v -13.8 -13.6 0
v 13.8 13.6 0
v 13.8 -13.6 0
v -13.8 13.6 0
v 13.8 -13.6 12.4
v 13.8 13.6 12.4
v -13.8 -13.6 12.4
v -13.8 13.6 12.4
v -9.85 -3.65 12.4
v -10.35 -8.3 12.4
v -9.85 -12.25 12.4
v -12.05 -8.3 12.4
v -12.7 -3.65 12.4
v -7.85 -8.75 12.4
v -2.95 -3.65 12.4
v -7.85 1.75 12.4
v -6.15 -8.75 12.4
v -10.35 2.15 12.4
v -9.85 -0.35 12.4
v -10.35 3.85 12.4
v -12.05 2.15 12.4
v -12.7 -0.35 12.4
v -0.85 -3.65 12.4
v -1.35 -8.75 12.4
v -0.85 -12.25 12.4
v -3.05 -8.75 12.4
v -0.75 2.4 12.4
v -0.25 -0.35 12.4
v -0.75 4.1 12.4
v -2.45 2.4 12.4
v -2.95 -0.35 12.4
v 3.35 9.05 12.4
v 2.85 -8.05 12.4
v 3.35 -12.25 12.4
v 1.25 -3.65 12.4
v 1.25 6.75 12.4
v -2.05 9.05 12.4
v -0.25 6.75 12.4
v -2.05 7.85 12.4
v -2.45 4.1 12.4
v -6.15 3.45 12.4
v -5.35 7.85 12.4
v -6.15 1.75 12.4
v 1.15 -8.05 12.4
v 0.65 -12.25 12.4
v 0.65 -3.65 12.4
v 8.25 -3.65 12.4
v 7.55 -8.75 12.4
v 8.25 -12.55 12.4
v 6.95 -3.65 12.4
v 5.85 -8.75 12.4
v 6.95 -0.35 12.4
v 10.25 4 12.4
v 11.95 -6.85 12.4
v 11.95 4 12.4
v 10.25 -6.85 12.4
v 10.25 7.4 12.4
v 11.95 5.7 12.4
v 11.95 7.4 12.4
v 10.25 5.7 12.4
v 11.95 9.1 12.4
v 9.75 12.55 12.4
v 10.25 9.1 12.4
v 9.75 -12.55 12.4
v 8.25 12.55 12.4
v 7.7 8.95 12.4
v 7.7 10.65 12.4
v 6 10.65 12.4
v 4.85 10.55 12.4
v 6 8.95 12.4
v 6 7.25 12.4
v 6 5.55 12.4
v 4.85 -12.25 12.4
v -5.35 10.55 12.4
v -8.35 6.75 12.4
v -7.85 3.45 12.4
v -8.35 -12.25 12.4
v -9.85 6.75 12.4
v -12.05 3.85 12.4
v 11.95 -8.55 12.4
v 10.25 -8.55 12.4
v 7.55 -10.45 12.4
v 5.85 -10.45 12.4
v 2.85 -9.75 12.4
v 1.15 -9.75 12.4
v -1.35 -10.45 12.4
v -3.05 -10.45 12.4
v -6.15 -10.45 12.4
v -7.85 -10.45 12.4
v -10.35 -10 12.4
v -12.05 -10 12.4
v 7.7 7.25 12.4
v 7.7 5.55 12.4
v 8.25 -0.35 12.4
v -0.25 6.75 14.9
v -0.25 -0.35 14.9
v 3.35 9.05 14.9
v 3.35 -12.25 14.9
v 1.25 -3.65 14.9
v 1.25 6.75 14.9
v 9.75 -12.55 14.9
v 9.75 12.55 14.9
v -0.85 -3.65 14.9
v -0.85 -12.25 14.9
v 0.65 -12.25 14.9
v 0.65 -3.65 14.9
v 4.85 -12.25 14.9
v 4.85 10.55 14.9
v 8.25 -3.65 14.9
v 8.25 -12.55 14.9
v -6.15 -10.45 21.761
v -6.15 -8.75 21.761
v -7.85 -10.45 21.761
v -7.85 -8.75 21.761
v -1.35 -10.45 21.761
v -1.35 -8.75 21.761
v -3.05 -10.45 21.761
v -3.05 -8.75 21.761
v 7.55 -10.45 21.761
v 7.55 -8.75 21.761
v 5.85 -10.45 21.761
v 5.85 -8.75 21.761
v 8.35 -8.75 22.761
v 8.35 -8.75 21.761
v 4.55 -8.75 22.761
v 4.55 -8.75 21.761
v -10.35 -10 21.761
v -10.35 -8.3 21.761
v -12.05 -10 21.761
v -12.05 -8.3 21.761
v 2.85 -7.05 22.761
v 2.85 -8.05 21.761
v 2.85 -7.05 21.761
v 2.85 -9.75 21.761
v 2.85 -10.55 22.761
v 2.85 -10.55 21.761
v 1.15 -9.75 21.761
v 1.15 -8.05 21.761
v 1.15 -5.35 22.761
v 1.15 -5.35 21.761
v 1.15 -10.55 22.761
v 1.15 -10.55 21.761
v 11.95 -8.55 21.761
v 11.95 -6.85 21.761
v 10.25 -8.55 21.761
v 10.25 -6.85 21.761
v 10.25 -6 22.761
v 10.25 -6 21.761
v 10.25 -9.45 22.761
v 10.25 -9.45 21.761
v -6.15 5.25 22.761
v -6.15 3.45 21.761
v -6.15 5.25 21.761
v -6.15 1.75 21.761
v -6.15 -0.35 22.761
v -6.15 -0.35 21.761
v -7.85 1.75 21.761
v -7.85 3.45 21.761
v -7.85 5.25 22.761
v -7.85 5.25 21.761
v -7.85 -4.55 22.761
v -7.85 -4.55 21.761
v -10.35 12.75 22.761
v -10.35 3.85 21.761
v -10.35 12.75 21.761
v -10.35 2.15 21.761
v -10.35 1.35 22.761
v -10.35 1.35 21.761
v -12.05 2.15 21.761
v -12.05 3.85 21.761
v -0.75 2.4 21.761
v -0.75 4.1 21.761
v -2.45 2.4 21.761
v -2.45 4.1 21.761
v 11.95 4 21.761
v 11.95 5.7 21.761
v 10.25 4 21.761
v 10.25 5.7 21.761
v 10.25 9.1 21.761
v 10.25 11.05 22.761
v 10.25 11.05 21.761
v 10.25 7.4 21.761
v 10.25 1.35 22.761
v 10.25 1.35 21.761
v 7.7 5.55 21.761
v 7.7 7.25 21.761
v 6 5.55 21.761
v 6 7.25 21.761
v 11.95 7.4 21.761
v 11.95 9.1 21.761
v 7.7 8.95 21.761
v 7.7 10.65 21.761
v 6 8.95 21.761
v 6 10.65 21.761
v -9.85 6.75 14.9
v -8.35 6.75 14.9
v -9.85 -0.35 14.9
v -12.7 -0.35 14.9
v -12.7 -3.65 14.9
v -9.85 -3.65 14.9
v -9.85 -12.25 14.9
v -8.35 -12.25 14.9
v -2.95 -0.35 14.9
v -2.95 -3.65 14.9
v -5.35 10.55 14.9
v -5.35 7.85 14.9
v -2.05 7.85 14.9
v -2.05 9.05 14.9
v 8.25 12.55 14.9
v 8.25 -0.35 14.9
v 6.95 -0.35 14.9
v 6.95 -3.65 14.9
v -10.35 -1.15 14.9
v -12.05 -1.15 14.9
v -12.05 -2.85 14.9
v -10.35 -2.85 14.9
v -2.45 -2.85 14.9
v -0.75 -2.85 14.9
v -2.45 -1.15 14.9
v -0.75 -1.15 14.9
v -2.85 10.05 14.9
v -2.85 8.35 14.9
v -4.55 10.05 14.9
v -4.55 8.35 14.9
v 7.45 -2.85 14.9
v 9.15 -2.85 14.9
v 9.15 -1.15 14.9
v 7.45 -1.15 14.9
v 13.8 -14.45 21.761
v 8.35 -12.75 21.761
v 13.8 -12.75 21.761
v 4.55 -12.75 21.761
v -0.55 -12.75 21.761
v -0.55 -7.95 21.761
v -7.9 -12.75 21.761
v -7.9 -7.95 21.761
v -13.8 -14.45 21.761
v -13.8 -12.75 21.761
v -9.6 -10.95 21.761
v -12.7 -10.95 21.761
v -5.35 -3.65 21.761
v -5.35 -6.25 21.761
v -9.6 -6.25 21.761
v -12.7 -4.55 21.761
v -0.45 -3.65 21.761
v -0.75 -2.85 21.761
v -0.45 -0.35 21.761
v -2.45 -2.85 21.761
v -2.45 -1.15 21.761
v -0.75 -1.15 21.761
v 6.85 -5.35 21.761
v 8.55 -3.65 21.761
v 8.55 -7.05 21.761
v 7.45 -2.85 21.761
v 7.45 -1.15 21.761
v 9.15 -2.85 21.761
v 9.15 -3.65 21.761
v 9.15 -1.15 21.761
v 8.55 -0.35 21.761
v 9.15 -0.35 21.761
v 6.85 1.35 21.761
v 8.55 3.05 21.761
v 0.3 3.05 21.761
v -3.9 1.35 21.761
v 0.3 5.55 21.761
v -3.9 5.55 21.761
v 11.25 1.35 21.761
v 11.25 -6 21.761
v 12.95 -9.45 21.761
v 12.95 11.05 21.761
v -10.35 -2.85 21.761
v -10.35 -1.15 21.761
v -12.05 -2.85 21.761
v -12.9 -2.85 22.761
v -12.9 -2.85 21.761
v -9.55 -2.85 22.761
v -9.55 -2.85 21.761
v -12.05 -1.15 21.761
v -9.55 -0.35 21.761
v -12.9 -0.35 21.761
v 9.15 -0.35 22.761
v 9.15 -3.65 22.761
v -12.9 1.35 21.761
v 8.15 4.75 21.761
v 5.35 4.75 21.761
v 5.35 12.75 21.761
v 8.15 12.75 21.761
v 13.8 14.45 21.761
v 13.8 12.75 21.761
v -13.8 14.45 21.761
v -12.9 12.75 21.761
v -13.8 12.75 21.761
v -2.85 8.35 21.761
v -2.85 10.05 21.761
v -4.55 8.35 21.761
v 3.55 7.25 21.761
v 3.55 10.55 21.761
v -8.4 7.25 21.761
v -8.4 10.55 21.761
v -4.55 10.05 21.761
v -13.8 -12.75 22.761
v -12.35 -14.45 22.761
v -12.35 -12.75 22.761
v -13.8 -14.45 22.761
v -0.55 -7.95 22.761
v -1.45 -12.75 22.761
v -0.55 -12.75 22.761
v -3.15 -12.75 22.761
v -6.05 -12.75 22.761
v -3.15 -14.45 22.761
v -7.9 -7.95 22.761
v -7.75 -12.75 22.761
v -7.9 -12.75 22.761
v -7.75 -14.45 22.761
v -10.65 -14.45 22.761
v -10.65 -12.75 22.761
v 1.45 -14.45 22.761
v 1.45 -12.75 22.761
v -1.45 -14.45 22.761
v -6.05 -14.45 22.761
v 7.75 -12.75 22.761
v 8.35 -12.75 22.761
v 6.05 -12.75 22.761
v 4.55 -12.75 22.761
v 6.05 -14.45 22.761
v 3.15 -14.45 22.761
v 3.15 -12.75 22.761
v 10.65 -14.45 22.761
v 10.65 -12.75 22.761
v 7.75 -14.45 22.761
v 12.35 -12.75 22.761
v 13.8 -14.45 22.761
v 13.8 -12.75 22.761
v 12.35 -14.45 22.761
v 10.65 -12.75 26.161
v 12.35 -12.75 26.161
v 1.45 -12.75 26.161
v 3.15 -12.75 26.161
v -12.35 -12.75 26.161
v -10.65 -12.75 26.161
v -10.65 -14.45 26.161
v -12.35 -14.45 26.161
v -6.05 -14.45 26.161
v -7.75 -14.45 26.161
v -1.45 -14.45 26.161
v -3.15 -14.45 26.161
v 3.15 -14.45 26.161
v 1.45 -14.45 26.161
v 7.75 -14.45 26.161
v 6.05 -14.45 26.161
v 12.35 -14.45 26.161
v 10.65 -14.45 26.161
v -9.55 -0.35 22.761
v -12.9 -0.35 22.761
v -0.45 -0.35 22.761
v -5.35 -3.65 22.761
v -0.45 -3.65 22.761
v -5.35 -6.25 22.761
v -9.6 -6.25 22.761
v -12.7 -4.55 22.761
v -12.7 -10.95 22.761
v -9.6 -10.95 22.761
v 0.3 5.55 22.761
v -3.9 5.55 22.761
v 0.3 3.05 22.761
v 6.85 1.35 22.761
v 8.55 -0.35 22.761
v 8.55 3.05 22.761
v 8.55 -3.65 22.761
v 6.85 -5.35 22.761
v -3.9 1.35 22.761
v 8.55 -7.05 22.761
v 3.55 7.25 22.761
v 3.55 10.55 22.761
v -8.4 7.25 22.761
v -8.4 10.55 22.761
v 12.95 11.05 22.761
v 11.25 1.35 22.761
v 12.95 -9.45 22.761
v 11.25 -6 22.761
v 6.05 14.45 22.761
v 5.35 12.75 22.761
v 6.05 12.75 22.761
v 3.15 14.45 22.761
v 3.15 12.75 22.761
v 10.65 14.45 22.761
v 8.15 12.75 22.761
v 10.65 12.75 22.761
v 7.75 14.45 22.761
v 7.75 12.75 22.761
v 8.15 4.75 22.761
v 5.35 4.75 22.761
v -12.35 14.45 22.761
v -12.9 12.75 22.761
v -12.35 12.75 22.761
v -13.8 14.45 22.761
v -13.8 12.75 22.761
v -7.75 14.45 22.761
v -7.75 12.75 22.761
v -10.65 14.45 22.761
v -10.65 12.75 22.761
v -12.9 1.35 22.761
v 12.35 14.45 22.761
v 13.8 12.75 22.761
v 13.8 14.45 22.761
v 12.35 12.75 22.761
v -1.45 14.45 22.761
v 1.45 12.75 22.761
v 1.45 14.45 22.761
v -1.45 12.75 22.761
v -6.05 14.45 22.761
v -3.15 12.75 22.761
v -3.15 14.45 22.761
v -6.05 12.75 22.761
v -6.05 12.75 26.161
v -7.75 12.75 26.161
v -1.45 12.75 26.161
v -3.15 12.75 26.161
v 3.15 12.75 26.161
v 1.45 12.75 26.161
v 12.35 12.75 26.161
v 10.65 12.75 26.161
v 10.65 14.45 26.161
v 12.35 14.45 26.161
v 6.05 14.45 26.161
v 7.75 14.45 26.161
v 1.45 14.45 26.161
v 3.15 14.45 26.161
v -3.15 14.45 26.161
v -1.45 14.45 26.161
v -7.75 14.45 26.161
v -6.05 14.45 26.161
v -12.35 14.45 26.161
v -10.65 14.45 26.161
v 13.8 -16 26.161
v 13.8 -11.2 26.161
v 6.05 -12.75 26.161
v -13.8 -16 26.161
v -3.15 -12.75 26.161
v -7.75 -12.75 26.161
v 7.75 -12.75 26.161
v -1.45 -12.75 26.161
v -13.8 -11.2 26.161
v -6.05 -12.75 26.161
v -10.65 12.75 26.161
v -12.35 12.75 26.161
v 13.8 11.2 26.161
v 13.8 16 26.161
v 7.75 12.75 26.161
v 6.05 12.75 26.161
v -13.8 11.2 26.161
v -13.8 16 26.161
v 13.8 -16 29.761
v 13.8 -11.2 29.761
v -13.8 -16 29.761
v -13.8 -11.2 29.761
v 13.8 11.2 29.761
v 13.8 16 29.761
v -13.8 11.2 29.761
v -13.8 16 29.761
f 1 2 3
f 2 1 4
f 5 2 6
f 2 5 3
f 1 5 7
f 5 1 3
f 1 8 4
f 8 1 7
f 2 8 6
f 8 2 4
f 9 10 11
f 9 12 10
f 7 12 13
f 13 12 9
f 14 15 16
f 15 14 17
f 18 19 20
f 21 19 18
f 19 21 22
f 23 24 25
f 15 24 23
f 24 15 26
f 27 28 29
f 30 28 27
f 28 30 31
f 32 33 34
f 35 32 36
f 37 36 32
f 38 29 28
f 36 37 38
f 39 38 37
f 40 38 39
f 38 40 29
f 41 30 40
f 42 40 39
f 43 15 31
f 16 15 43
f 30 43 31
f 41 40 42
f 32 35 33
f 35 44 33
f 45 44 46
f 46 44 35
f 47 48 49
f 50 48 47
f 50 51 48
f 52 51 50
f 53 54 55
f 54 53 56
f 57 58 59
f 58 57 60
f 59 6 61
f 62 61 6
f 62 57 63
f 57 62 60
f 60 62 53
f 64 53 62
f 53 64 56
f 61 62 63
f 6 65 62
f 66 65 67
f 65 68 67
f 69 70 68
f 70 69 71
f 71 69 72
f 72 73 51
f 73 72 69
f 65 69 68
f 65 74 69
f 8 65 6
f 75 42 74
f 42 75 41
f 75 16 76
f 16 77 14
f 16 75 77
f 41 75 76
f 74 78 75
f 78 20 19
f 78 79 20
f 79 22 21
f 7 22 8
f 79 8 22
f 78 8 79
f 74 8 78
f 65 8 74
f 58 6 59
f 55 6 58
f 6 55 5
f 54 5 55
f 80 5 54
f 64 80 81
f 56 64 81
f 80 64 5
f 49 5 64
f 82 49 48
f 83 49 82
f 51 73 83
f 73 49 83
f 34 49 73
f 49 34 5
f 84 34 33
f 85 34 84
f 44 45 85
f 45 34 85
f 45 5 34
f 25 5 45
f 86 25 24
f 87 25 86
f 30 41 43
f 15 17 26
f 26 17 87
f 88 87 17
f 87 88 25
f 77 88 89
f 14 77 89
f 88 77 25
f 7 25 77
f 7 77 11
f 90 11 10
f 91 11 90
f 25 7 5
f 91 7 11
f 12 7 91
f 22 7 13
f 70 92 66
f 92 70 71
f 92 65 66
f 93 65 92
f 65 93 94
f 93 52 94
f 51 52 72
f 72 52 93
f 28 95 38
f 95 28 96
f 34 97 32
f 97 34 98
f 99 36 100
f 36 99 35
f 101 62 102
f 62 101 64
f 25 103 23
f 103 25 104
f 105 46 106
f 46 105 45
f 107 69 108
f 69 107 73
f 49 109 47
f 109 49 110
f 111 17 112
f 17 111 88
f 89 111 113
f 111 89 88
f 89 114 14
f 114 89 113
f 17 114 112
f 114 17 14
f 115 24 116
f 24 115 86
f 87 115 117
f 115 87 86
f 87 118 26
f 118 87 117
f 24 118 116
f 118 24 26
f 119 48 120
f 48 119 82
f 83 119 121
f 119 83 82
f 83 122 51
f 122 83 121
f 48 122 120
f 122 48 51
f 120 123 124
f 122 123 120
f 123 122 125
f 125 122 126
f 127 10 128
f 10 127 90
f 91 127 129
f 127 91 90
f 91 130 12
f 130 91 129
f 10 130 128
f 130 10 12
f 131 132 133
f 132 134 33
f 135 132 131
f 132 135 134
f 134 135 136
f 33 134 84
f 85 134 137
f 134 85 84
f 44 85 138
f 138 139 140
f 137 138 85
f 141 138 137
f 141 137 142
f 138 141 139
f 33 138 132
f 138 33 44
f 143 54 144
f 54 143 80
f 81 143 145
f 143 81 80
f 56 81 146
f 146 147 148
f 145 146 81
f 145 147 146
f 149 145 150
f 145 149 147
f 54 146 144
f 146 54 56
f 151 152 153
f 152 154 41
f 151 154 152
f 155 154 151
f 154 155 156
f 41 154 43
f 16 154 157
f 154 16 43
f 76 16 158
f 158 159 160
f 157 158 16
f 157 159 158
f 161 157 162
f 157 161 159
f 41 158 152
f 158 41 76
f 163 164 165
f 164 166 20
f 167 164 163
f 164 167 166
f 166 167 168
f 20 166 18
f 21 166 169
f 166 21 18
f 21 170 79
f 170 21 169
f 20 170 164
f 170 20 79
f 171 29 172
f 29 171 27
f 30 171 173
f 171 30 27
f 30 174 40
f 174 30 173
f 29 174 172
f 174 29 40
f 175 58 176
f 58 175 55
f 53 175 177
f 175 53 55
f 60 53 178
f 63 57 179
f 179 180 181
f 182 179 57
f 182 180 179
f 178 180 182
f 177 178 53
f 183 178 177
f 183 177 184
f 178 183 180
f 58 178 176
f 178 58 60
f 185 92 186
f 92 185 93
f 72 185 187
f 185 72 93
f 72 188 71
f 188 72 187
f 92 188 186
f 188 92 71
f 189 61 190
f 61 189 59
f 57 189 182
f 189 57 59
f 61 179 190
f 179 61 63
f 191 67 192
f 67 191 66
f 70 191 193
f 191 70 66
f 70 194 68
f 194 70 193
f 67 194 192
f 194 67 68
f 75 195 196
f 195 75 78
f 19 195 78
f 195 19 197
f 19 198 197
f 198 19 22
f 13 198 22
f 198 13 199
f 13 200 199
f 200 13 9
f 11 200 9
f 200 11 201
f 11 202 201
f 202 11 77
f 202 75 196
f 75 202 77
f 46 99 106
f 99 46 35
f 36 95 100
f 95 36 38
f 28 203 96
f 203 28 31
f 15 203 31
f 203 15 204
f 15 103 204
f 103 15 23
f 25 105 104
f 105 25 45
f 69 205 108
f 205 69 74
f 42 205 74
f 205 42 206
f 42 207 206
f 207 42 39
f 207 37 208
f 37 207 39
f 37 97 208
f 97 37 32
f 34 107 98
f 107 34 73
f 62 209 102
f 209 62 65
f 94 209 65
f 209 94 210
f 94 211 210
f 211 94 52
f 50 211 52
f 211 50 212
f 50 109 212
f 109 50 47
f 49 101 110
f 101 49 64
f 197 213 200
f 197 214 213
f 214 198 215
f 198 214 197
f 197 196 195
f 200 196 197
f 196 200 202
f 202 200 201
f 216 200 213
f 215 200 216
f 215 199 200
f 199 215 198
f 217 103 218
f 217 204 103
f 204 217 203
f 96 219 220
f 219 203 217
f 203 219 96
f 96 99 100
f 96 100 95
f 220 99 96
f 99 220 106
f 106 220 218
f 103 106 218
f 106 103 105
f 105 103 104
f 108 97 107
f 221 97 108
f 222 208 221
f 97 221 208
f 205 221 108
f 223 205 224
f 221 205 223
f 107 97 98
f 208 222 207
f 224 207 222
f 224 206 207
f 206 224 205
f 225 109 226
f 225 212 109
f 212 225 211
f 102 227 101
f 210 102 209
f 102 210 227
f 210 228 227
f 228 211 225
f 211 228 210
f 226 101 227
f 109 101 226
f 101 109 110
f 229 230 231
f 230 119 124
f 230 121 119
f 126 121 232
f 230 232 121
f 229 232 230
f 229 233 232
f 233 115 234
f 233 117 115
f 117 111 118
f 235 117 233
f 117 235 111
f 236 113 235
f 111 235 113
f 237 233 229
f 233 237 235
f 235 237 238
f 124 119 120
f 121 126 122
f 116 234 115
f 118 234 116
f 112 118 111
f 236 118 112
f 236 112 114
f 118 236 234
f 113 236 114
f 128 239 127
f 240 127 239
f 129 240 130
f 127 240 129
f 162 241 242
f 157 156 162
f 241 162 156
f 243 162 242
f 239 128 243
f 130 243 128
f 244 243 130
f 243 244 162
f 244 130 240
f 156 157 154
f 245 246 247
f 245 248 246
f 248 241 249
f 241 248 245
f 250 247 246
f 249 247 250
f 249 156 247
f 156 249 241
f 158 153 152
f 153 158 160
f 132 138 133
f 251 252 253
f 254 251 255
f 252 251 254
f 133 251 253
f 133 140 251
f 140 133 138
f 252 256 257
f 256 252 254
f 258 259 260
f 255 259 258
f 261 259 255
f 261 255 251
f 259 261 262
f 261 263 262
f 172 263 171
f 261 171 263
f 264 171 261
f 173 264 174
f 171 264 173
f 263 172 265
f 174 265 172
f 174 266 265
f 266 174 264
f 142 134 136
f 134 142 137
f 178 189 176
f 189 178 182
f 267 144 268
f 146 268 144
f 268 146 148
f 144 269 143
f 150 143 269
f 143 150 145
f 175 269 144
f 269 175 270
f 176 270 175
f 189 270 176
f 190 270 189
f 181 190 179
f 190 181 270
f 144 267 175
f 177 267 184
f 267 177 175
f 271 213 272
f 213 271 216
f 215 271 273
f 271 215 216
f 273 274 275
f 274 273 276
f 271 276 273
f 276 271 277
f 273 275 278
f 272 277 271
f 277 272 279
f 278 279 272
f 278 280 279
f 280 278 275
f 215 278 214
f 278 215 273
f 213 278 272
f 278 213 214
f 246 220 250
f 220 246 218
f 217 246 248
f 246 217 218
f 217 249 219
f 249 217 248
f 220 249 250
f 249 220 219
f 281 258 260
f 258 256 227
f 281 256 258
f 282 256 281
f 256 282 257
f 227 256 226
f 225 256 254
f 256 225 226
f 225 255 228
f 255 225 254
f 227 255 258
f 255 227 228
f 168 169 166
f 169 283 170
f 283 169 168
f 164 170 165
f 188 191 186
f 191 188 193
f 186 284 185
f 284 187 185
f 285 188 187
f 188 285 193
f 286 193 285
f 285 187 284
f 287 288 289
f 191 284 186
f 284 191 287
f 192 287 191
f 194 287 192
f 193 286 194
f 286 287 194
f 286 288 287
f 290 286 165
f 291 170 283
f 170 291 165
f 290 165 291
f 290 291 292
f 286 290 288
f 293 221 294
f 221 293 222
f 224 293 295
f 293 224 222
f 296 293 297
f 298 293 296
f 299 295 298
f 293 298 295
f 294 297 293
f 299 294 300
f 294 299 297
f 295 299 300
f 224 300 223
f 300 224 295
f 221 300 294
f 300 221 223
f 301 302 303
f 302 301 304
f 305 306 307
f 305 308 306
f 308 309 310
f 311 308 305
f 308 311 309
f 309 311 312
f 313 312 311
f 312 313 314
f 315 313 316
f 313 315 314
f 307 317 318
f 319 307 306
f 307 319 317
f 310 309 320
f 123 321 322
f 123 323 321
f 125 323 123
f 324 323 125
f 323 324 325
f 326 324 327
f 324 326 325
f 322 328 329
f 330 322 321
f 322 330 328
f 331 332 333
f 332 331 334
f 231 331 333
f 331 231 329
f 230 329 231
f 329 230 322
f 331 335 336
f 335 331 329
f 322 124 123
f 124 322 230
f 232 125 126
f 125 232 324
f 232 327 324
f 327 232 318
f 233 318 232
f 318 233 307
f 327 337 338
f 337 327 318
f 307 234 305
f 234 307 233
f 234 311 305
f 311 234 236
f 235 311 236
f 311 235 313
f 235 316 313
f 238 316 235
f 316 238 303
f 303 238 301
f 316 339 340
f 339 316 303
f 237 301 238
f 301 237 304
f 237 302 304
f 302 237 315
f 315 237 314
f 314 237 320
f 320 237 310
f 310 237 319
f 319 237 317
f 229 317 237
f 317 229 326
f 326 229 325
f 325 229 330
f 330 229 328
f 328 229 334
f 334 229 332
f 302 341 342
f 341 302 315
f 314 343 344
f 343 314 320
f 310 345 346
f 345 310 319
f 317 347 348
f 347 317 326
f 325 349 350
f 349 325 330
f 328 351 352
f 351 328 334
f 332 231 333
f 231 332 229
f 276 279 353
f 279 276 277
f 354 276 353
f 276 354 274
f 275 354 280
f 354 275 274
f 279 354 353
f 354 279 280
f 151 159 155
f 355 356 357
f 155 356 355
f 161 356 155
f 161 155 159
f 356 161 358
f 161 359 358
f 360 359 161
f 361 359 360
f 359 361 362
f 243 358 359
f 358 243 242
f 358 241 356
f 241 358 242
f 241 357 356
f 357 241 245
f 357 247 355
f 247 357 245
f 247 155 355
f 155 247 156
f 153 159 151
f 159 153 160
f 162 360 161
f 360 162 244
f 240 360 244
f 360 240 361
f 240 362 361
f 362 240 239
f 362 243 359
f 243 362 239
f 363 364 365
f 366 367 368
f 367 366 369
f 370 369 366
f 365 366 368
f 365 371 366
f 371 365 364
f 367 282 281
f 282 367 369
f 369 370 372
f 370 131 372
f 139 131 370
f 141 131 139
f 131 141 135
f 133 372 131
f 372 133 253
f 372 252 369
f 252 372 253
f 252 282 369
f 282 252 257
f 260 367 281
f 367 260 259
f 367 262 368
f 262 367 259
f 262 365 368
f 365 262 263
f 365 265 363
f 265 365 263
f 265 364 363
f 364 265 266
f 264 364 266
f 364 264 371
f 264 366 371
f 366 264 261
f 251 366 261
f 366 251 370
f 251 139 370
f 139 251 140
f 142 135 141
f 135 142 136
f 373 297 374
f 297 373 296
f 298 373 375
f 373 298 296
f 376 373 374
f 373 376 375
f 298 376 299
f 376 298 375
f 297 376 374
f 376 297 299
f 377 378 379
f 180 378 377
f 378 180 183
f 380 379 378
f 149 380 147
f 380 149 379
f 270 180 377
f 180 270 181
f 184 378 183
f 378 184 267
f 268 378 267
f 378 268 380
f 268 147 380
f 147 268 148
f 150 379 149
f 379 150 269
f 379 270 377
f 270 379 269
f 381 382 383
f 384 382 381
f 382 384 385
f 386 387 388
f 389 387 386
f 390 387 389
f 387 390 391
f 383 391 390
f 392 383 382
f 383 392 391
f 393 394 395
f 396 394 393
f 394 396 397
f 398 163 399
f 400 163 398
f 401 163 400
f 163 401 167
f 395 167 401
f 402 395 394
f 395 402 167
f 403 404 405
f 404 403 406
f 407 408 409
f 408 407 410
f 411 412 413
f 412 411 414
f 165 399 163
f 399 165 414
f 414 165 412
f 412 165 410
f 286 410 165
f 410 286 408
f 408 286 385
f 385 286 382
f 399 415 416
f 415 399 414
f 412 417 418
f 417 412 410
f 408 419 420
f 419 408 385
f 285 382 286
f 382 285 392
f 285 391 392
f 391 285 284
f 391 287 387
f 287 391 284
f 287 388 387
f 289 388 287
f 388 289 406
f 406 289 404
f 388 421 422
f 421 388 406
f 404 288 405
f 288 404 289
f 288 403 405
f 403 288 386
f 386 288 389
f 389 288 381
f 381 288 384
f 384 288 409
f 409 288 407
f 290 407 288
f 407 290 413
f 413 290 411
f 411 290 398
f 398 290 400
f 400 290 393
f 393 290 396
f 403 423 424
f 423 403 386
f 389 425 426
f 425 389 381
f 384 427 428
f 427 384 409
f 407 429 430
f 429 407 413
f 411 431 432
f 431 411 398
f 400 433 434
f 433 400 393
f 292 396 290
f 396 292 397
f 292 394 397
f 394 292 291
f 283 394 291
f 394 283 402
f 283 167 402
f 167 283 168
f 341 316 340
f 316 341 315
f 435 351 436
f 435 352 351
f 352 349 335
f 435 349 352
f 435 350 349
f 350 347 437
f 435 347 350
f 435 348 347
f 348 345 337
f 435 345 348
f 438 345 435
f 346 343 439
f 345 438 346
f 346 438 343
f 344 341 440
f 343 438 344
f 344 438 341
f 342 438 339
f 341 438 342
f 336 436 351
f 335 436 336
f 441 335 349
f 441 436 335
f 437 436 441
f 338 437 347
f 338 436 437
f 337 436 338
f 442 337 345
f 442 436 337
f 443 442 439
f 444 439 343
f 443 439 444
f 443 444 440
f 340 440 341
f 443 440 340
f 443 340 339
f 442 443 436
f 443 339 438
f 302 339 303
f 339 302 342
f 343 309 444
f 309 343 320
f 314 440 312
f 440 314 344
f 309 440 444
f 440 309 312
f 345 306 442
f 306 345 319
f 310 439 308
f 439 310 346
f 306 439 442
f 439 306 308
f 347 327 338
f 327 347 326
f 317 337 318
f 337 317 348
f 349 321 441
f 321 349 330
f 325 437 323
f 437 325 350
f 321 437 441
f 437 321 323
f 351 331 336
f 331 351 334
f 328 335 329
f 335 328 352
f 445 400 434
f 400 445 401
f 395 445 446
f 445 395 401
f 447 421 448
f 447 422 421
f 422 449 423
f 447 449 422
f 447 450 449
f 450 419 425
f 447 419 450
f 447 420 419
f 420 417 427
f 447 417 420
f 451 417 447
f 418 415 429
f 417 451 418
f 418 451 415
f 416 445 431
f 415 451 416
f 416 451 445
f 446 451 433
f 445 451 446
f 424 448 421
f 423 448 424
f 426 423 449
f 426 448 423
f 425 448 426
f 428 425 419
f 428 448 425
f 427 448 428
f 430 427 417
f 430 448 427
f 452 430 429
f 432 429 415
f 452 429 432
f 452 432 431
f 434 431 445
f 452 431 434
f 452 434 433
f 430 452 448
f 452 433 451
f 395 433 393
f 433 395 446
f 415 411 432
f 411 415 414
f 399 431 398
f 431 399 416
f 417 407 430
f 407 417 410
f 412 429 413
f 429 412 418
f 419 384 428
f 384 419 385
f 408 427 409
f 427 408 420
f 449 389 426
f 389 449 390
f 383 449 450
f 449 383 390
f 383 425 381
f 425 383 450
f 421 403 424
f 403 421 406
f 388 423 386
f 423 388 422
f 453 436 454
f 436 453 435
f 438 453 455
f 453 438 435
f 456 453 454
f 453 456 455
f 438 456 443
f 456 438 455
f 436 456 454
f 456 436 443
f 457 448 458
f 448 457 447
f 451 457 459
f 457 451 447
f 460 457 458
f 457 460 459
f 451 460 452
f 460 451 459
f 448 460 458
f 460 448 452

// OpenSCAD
// Generated by SolidPython 0.4.2 on 2020-09-29 23:21:07
//!OpenSCAD

scale(v = 0.0100000000) {
	translate(v = [-1380, -1360, 0]) {
		union() {
			color(c = [0.4000000000, 0.4000000000, 0.4000000000]) {
				translate(v = [0, 0, 0]) {
					linear_extrude(height = 1000.0000000000) {
						polygon(paths = [[0, 1, 2, 3]], points = [[0, 0], [0, 2720], [2760, 2720], [2760, 0]]);
					}
				}
			}
			color(c = [0.2000000000, 0.6000000000, 0.2000000000]) {
				translate(v = [0, 0, 1000.0000000000]) {
					linear_extrude(height = 120.0000000000) {
						polygon(paths = [[0, 1, 2, 3]], points = [[0, 1305], [0, 2720], [2760, 2720], [2760, 1305]]);
					}
				}
			}
			color(c = [0.4000000000, 0.4000000000, 0.4000000000]) {
				translate(v = [0, 0, 1000.0000000000]) {
					linear_extrude(height = 120.0000000000) {
						polygon(paths = [[0, 1, 2, 3]], points = [[0, 0], [0, 1305], [2760, 1305], [2760, 0]]);
					}
				}
			}
			color(c = [0.9000000000, 0.6000000000, 0.6000000000]) {
				translate(v = [0, 0, 1120.0000000000]) {
					linear_extrude(height = 120.0000000000) {
						polygon(paths = [[0, 1, 2, 3]], points = [[135, 1485], [135, 1905], [395, 1905], [395, 1485]]);
					}
				}
			}
			color(c = [0.9000000000, 0.6000000000, 0.6000000000]) {
				translate(v = [0, 0, 1120.0000000000]) {
					linear_extrude(height = 120.0000000000) {
						polygon(paths = [[0, 1, 2, 3]], points = [[545, 1485], [545, 1905], [825, 1905], [825, 1485]]);
					}
				}
			}
			color(c = [0.9000000000, 0.6000000000, 0.6000000000]) {
				translate(v = [0, 0, 1120.0000000000]) {
					linear_extrude(height = 120.0000000000) {
						polygon(paths = [[0, 1, 2, 3]], points = [[1095, 1485], [1095, 1905], [1355, 1905], [1355, 1485]]);
					}
				}
			}
			color(c = [0.9000000000, 0.6000000000, 0.6000000000]) {
				translate(v = [0, 0, 1120.0000000000]) {
					linear_extrude(height = 120.0000000000) {
						polygon(paths = [[0, 1, 2, 3]], points = [[1505, 1485], [1505, 1905], [1715, 1905], [1715, 1485]]);
					}
				}
			}
			color(c = [0.9000000000, 0.6000000000, 0.6000000000]) {
				translate(v = [0, 0, 1120.0000000000]) {
					linear_extrude(height = 120.0000000000) {
						polygon(paths = [[0, 1, 2, 3, 4, 5]], points = [[1865, 1485], [1865, 1905], [1940, 1905], [1940, 2485], [2205, 2485], [2205, 1485]]);
					}
				}
			}
			color(c = [0.9000000000, 0.6000000000, 0.6000000000]) {
				translate(v = [0, 0, 1120.0000000000]) {
					linear_extrude(height = 120.0000000000) {
						polygon(paths = [[0, 1, 2, 3]], points = [[2355, 1485], [2355, 2485], [2625, 2485], [2625, 1485]]);
					}
				}
			}
			color(c = [0.9000000000, 0.6000000000, 0.9000000000]) {
				translate(v = [0, 0, 1120.0000000000]) {
					linear_extrude(height = 120.0000000000) {
						polygon(paths = [[0, 1, 2, 3]], points = [[135, 265], [135, 685], [395, 685], [395, 265]]);
					}
				}
			}
			color(c = [0.9000000000, 0.6000000000, 0.9000000000]) {
				translate(v = [0, 0, 1120.0000000000]) {
					linear_extrude(height = 120.0000000000) {
						polygon(paths = [[0, 1, 2, 3]], points = [[545, 265], [545, 685], [1295, 685], [1295, 265]]);
					}
				}
			}
			color(c = [0.9000000000, 0.6000000000, 0.9000000000]) {
				translate(v = [0, 0, 1120.0000000000]) {
					linear_extrude(height = 120.0000000000) {
						polygon(paths = [[0, 1, 2, 3]], points = [[1445, 265], [1445, 685], [1715, 685], [1715, 265]]);
					}
				}
			}
			color(c = [0.9000000000, 0.6000000000, 0.9000000000]) {
				translate(v = [0, 0, 1120.0000000000]) {
					linear_extrude(height = 120.0000000000) {
						polygon(paths = [[0, 1, 2, 3, 4, 5, 6, 7]], points = [[1940, 235], [1940, 265], [1865, 265], [1865, 685], [1940, 685], [1940, 885], [2205, 885], [2205, 235]]);
					}
				}
			}
			color(c = [0.9000000000, 0.6000000000, 0.9000000000]) {
				translate(v = [0, 0, 1120.0000000000]) {
					linear_extrude(height = 120.0000000000) {
						polygon(paths = [[0, 1, 2, 3]], points = [[2355, 235], [2355, 885], [2625, 885], [2625, 235]]);
					}
				}
			}
			color(c = [0.2000000000, 0.6000000000, 0.2000000000]) {
				translate(v = [0, 0, 1120.0000000000]) {
					linear_extrude(height = 120.0000000000) {
						difference() {
							polygon(paths = [[0, 1, 2, 3]], points = [[0, 1305], [0, 2720], [2760, 2720], [2760, 1305]]);
							polygon(paths = [[0, 1, 2, 3]], points = [[135, 1485], [395, 1485], [395, 1905], [135, 1905]]);
							polygon(paths = [[0, 1, 2, 3]], points = [[545, 1485], [825, 1485], [825, 1905], [545, 1905]]);
							polygon(paths = [[0, 1, 2, 3]], points = [[1095, 1485], [1355, 1485], [1355, 1905], [1095, 1905]]);
							polygon(paths = [[0, 1, 2, 3]], points = [[1505, 1485], [1715, 1485], [1715, 1905], [1505, 1905]]);
							polygon(paths = [[0, 1, 2, 3]], points = [[2355, 1485], [2625, 1485], [2625, 2485], [2355, 2485]]);
							polygon(paths = [[0, 1, 2, 3, 4, 5]], points = [[1865, 1485], [2205, 1485], [2205, 2485], [1940, 2485], [1940, 1905], [1865, 1905]]);
						}
					}
				}
			}
			color(c = [0.4000000000, 0.4000000000, 0.4000000000]) {
				translate(v = [0, 0, 1120.0000000000]) {
					linear_extrude(height = 120.0000000000) {
						difference() {
							polygon(paths = [[0, 1, 2, 3]], points = [[0, 0], [0, 1305], [2760, 1305], [2760, 0]]);
							polygon(paths = [[0, 1, 2, 3]], points = [[2355, 235], [2625, 235], [2625, 885], [2355, 885]]);
							polygon(paths = [[0, 1, 2, 3]], points = [[135, 265], [395, 265], [395, 685], [135, 685]]);
							polygon(paths = [[0, 1, 2, 3]], points = [[545, 265], [1295, 265], [1295, 685], [545, 685]]);
							polygon(paths = [[0, 1, 2, 3]], points = [[1445, 265], [1715, 265], [1715, 685], [1445, 685]]);
							polygon(paths = [[0, 1, 2, 3, 4, 5, 6, 7]], points = [[1940, 235], [2205, 235], [2205, 885], [1940, 885], [1940, 685], [1865, 685], [1865, 265], [1940, 265]]);
						}
					}
				}
			}
			color(c = [0.1000000000, 0.1000000000, 0.1000000000]) {
				translate(v = [0, 0, 1240.0000000000]) {
					linear_extrude(height = 70.0000000000) {
						polygon(paths = [[0, 1, 2, 3]], points = [[595, 315], [595, 485], [765, 485], [765, 315]]);
					}
				}
			}
			color(c = [0.1000000000, 0.1000000000, 0.1000000000]) {
				translate(v = [0, 0, 1240.0000000000]) {
					linear_extrude(height = 70.0000000000) {
						polygon(paths = [[0, 1, 2, 3]], points = [[1075, 315], [1075, 485], [1245, 485], [1245, 315]]);
					}
				}
			}
			color(c = [0.1000000000, 0.1000000000, 0.1000000000]) {
				translate(v = [0, 0, 1240.0000000000]) {
					linear_extrude(height = 70.0000000000) {
						polygon(paths = [[0, 1, 2, 3]], points = [[1965, 315], [1965, 485], [2135, 485], [2135, 315]]);
					}
				}
			}
			color(c = [0.1000000000, 0.1000000000, 0.1000000000]) {
				translate(v = [0, 0, 1240.0000000000]) {
					linear_extrude(height = 70.0000000000) {
						polygon(paths = [[0, 1, 2, 3]], points = [[175, 360], [175, 530], [345, 530], [345, 360]]);
					}
				}
			}
			color(c = [0.1000000000, 0.1000000000, 0.1000000000]) {
				translate(v = [0, 0, 1240.0000000000]) {
					linear_extrude(height = 70.0000000000) {
						polygon(paths = [[0, 1, 2, 3]], points = [[1495, 385], [1495, 555], [1665, 555], [1665, 385]]);
					}
				}
			}
			color(c = [0.1000000000, 0.1000000000, 0.1000000000]) {
				translate(v = [0, 0, 1240.0000000000]) {
					linear_extrude(height = 70.0000000000) {
						polygon(paths = [[0, 1, 2, 3]], points = [[2405, 505], [2405, 675], [2575, 675], [2575, 505]]);
					}
				}
			}
			color(c = [0.1000000000, 0.1000000000, 0.1000000000]) {
				translate(v = [0, 0, 1240.0000000000]) {
					linear_extrude(height = 70.0000000000) {
						polygon(paths = [[0, 1, 2, 3]], points = [[595, 1535], [595, 1705], [765, 1705], [765, 1535]]);
					}
				}
			}
			color(c = [0.1000000000, 0.1000000000, 0.1000000000]) {
				translate(v = [0, 0, 1240.0000000000]) {
					linear_extrude(height = 70.0000000000) {
						polygon(paths = [[0, 1, 2, 3]], points = [[175, 1575], [175, 1745], [345, 1745], [345, 1575]]);
					}
				}
			}
			color(c = [0.1000000000, 0.1000000000, 0.1000000000]) {
				translate(v = [0, 0, 1240.0000000000]) {
					linear_extrude(height = 70.0000000000) {
						polygon(paths = [[0, 1, 2, 3]], points = [[1135, 1600], [1135, 1770], [1305, 1770], [1305, 1600]]);
					}
				}
			}
			color(c = [0.1000000000, 0.1000000000, 0.1000000000]) {
				translate(v = [0, 0, 1240.0000000000]) {
					linear_extrude(height = 70.0000000000) {
						polygon(paths = [[0, 1, 2, 3]], points = [[2405, 1760], [2405, 1930], [2575, 1930], [2575, 1760]]);
					}
				}
			}
			color(c = [0.1000000000, 0.1000000000, 0.1000000000]) {
				translate(v = [0, 0, 1240.0000000000]) {
					linear_extrude(height = 70.0000000000) {
						polygon(paths = [[0, 1, 2, 3]], points = [[1980, 1915], [1980, 2085], [2150, 2085], [2150, 1915]]);
					}
				}
			}
			color(c = [0.1000000000, 0.1000000000, 0.1000000000]) {
				translate(v = [0, 0, 1240.0000000000]) {
					linear_extrude(height = 70.0000000000) {
						polygon(paths = [[0, 1, 2, 3]], points = [[2405, 2100], [2405, 2270], [2575, 2270], [2575, 2100]]);
					}
				}
			}
			color(c = [0.1000000000, 0.1000000000, 0.1000000000]) {
				translate(v = [0, 0, 1240.0000000000]) {
					linear_extrude(height = 70.0000000000) {
						polygon(paths = [[0, 1, 2, 3]], points = [[1980, 2255], [1980, 2425], [2150, 2425], [2150, 2255]]);
					}
				}
			}
			color(c = [1.0000000000, 1.0000000000, 1.0000000000]) {
				translate(v = [0, 0, 1240.0000000000]) {
					linear_extrude(height = 70.0000000000) {
						polygon(paths = [[0, 1, 2, 3, 4, 5, 6, 7]], points = [[395, 135], [395, 995], [110, 995], [110, 1325], [395, 1325], [395, 2035], [545, 2035], [545, 135]]);
					}
				}
			}
			color(c = [1.0000000000, 1.0000000000, 1.0000000000]) {
				translate(v = [0, 0, 1240.0000000000]) {
					linear_extrude(height = 70.0000000000) {
						polygon(paths = [[0, 1, 2, 3, 4, 5, 6, 7, 8, 9]], points = [[1295, 135], [1295, 995], [1085, 995], [1085, 1325], [1355, 1325], [1355, 2035], [1505, 2035], [1505, 995], [1445, 995], [1445, 135]]);
					}
				}
			}
			color(c = [1.0000000000, 1.0000000000, 1.0000000000]) {
				translate(v = [0, 0, 1240.0000000000]) {
					linear_extrude(height = 70.0000000000) {
						polygon(paths = [[0, 1, 2, 3, 4, 5, 6, 7]], points = [[1715, 135], [1715, 2265], [1175, 2265], [1175, 2145], [845, 2145], [845, 2415], [1865, 2415], [1865, 135]]);
					}
				}
			}
			color(c = [1.0000000000, 1.0000000000, 1.0000000000]) {
				translate(v = [0, 0, 1240.0000000000]) {
					linear_extrude(height = 70.0000000000) {
						polygon(paths = [[0, 1, 2, 3, 4, 5, 6, 7]], points = [[2205, 105], [2205, 995], [2075, 995], [2075, 1325], [2205, 1325], [2205, 2615], [2355, 2615], [2355, 105]]);
					}
				}
			}
			color(c = [0.1000000000, 0.1000000000, 0.1000000000]) {
				translate(v = [0, 0, 1310.0000000000]) {
					linear_extrude(height = 180.0000000000) {
						polygon(paths = [[0, 1, 2, 3]], points = [[595, 315], [595, 485], [765, 485], [765, 315]]);
					}
				}
			}
			color(c = [0.1000000000, 0.1000000000, 0.1000000000]) {
				translate(v = [0, 0, 1310.0000000000]) {
					linear_extrude(height = 180.0000000000) {
						polygon(paths = [[0, 1, 2, 3]], points = [[1075, 315], [1075, 485], [1245, 485], [1245, 315]]);
					}
				}
			}
			color(c = [0.1000000000, 0.1000000000, 0.1000000000]) {
				translate(v = [0, 0, 1310.0000000000]) {
					linear_extrude(height = 180.0000000000) {
						polygon(paths = [[0, 1, 2, 3]], points = [[1965, 315], [1965, 485], [2135, 485], [2135, 315]]);
					}
				}
			}
			color(c = [0.1000000000, 0.1000000000, 0.1000000000]) {
				translate(v = [0, 0, 1310.0000000000]) {
					linear_extrude(height = 180.0000000000) {
						polygon(paths = [[0, 1, 2, 3]], points = [[175, 360], [175, 530], [345, 530], [345, 360]]);
					}
				}
			}
			color(c = [0.1000000000, 0.1000000000, 0.1000000000]) {
				translate(v = [0, 0, 1310.0000000000]) {
					linear_extrude(height = 180.0000000000) {
						polygon(paths = [[0, 1, 2, 3]], points = [[1495, 385], [1495, 555], [1665, 555], [1665, 385]]);
					}
				}
			}
			color(c = [0.1000000000, 0.1000000000, 0.1000000000]) {
				translate(v = [0, 0, 1310.0000000000]) {
					linear_extrude(height = 180.0000000000) {
						polygon(paths = [[0, 1, 2, 3]], points = [[2405, 505], [2405, 675], [2575, 675], [2575, 505]]);
					}
				}
			}
			color(c = [0.1000000000, 0.1000000000, 0.1000000000]) {
				translate(v = [0, 0, 1310.0000000000]) {
					linear_extrude(height = 180.0000000000) {
						polygon(paths = [[0, 1, 2, 3]], points = [[595, 1535], [595, 1705], [765, 1705], [765, 1535]]);
					}
				}
			}
			color(c = [0.1000000000, 0.1000000000, 0.1000000000]) {
				translate(v = [0, 0, 1310.0000000000]) {
					linear_extrude(height = 180.0000000000) {
						polygon(paths = [[0, 1, 2, 3]], points = [[175, 1575], [175, 1745], [345, 1745], [345, 1575]]);
					}
				}
			}
			color(c = [0.1000000000, 0.1000000000, 0.1000000000]) {
				translate(v = [0, 0, 1310.0000000000]) {
					linear_extrude(height = 180.0000000000) {
						polygon(paths = [[0, 1, 2, 3]], points = [[1135, 1600], [1135, 1770], [1305, 1770], [1305, 1600]]);
					}
				}
			}
			color(c = [0.1000000000, 0.1000000000, 0.1000000000]) {
				translate(v = [0, 0, 1310.0000000000]) {
					linear_extrude(height = 180.0000000000) {
						polygon(paths = [[0, 1, 2, 3]], points = [[2405, 1760], [2405, 1930], [2575, 1930], [2575, 1760]]);
					}
				}
			}
			color(c = [0.1000000000, 0.1000000000, 0.1000000000]) {
				translate(v = [0, 0, 1310.0000000000]) {
					linear_extrude(height = 180.0000000000) {
						polygon(paths = [[0, 1, 2, 3]], points = [[1980, 1915], [1980, 2085], [2150, 2085], [2150, 1915]]);
					}
				}
			}
			color(c = [0.1000000000, 0.1000000000, 0.1000000000]) {
				translate(v = [0, 0, 1310.0000000000]) {
					linear_extrude(height = 180.0000000000) {
						polygon(paths = [[0, 1, 2, 3]], points = [[2405, 2100], [2405, 2270], [2575, 2270], [2575, 2100]]);
					}
				}
			}
			color(c = [0.1000000000, 0.1000000000, 0.1000000000]) {
				translate(v = [0, 0, 1310.0000000000]) {
					linear_extrude(height = 180.0000000000) {
						polygon(paths = [[0, 1, 2, 3]], points = [[1980, 2255], [1980, 2425], [2150, 2425], [2150, 2255]]);
					}
				}
			}
			color(c = [0.7000000000, 0, 0]) {
				translate(v = [0, 0, 1310.0000000000]) {
					linear_extrude(height = 180.0000000000) {
						polygon(paths = [[0, 1, 2, 3, 4, 5, 6, 7]], points = [[395, 135], [395, 995], [110, 995], [110, 1325], [395, 1325], [395, 2035], [545, 2035], [545, 135]]);
					}
				}
			}
			color(c = [0.7000000000, 0, 0]) {
				translate(v = [0, 0, 1310.0000000000]) {
					linear_extrude(height = 180.0000000000) {
						polygon(paths = [[0, 1, 2, 3, 4, 5, 6, 7, 8, 9]], points = [[1295, 135], [1295, 995], [1085, 995], [1085, 1325], [1355, 1325], [1355, 2035], [1505, 2035], [1505, 995], [1445, 995], [1445, 135]]);
					}
				}
			}
			color(c = [0.7000000000, 0, 0]) {
				translate(v = [0, 0, 1310.0000000000]) {
					linear_extrude(height = 180.0000000000) {
						polygon(paths = [[0, 1, 2, 3, 4, 5, 6, 7]], points = [[1715, 135], [1715, 2265], [1175, 2265], [1175, 2145], [845, 2145], [845, 2415], [1865, 2415], [1865, 135]]);
					}
				}
			}
			color(c = [0.7000000000, 0, 0]) {
				translate(v = [0, 0, 1310.0000000000]) {
					linear_extrude(height = 180.0000000000) {
						polygon(paths = [[0, 1, 2, 3, 4, 5, 6, 7]], points = [[2205, 105], [2205, 995], [2075, 995], [2075, 1325], [2205, 1325], [2205, 2615], [2355, 2615], [2355, 105]]);
					}
				}
			}
			color(c = [0.1000000000, 0.1000000000, 0.1000000000]) {
				translate(v = [0, 0, 1490.0000000000]) {
					linear_extrude(height = 686.1000000000) {
						polygon(paths = [[0, 1, 2, 3]], points = [[595, 315], [595, 485], [765, 485], [765, 315]]);
					}
				}
			}
			color(c = [0.1000000000, 0.1000000000, 0.1000000000]) {
				translate(v = [0, 0, 1490.0000000000]) {
					linear_extrude(height = 686.1000000000) {
						polygon(paths = [[0, 1, 2, 3]], points = [[1075, 315], [1075, 485], [1245, 485], [1245, 315]]);
					}
				}
			}
			color(c = [0.1000000000, 0.1000000000, 0.1000000000]) {
				translate(v = [0, 0, 1490.0000000000]) {
					linear_extrude(height = 686.1000000000) {
						polygon(paths = [[0, 1, 2, 3]], points = [[1965, 315], [1965, 485], [2135, 485], [2135, 315]]);
					}
				}
			}
			color(c = [0.1000000000, 0.1000000000, 0.1000000000]) {
				translate(v = [0, 0, 1490.0000000000]) {
					linear_extrude(height = 686.1000000000) {
						polygon(paths = [[0, 1, 2, 3]], points = [[175, 360], [175, 530], [345, 530], [345, 360]]);
					}
				}
			}
			color(c = [0.1000000000, 0.1000000000, 0.1000000000]) {
				translate(v = [0, 0, 1490.0000000000]) {
					linear_extrude(height = 686.1000000000) {
						polygon(paths = [[0, 1, 2, 3]], points = [[1495, 385], [1495, 555], [1665, 555], [1665, 385]]);
					}
				}
			}
			color(c = [0.1000000000, 0.1000000000, 0.1000000000]) {
				translate(v = [0, 0, 1490.0000000000]) {
					linear_extrude(height = 686.1000000000) {
						polygon(paths = [[0, 1, 2, 3]], points = [[2405, 505], [2405, 675], [2575, 675], [2575, 505]]);
					}
				}
			}
			color(c = [0.1000000000, 0.1000000000, 0.1000000000]) {
				translate(v = [0, 0, 1490.0000000000]) {
					linear_extrude(height = 686.1000000000) {
						polygon(paths = [[0, 1, 2, 3]], points = [[175, 1075], [175, 1245], [345, 1245], [345, 1075]]);
					}
				}
			}
			color(c = [0.1000000000, 0.1000000000, 0.1000000000]) {
				translate(v = [0, 0, 1490.0000000000]) {
					linear_extrude(height = 686.1000000000) {
						polygon(paths = [[0, 1, 2, 3]], points = [[1135, 1075], [1135, 1245], [1305, 1245], [1305, 1075]]);
					}
				}
			}
			color(c = [0.1000000000, 0.1000000000, 0.1000000000]) {
				translate(v = [0, 0, 1490.0000000000]) {
					linear_extrude(height = 686.1000000000) {
						polygon(paths = [[0, 1, 2, 3]], points = [[2125, 1075], [2125, 1245], [2295, 1245], [2295, 1075]]);
					}
				}
			}
			color(c = [0.1000000000, 0.1000000000, 0.1000000000]) {
				translate(v = [0, 0, 1490.0000000000]) {
					linear_extrude(height = 686.1000000000) {
						polygon(paths = [[0, 1, 2, 3]], points = [[595, 1535], [595, 1705], [765, 1705], [765, 1535]]);
					}
				}
			}
			color(c = [0.1000000000, 0.1000000000, 0.1000000000]) {
				translate(v = [0, 0, 1490.0000000000]) {
					linear_extrude(height = 686.1000000000) {
						polygon(paths = [[0, 1, 2, 3]], points = [[175, 1575], [175, 1745], [345, 1745], [345, 1575]]);
					}
				}
			}
			color(c = [0.1000000000, 0.1000000000, 0.1000000000]) {
				translate(v = [0, 0, 1490.0000000000]) {
					linear_extrude(height = 686.1000000000) {
						polygon(paths = [[0, 1, 2, 3]], points = [[1135, 1600], [1135, 1770], [1305, 1770], [1305, 1600]]);
					}
				}
			}
			color(c = [0.1000000000, 0.1000000000, 0.1000000000]) {
				translate(v = [0, 0, 1490.0000000000]) {
					linear_extrude(height = 686.1000000000) {
						polygon(paths = [[0, 1, 2, 3]], points = [[2405, 1760], [2405, 1930], [2575, 1930], [2575, 1760]]);
					}
				}
			}
			color(c = [0.1000000000, 0.1000000000, 0.1000000000]) {
				translate(v = [0, 0, 1490.0000000000]) {
					linear_extrude(height = 686.1000000000) {
						polygon(paths = [[0, 1, 2, 3]], points = [[1980, 1915], [1980, 2085], [2150, 2085], [2150, 1915]]);
					}
				}
			}
			color(c = [0.1000000000, 0.1000000000, 0.1000000000]) {
				translate(v = [0, 0, 1490.0000000000]) {
					linear_extrude(height = 686.1000000000) {
						polygon(paths = [[0, 1, 2, 3]], points = [[2405, 2100], [2405, 2270], [2575, 2270], [2575, 2100]]);
					}
				}
			}
			color(c = [0.1000000000, 0.1000000000, 0.1000000000]) {
				translate(v = [0, 0, 1490.0000000000]) {
					linear_extrude(height = 686.1000000000) {
						polygon(paths = [[0, 1, 2, 3]], points = [[925, 2195], [925, 2365], [1095, 2365], [1095, 2195]]);
					}
				}
			}
			color(c = [0.1000000000, 0.1000000000, 0.1000000000]) {
				translate(v = [0, 0, 1490.0000000000]) {
					linear_extrude(height = 686.1000000000) {
						polygon(paths = [[0, 1, 2, 3]], points = [[1980, 2255], [1980, 2425], [2150, 2425], [2150, 2255]]);
					}
				}
			}
			color(c = [0.9000000000, 0.6000000000, 0.6000000000]) {
				translate(v = [0, 0, 2176.1000000000]) {
					linear_extrude(height = 100.0000000000) {
						polygon(paths = [[0, 1, 2, 3, 4, 5, 6, 7, 8, 9, 10, 11]], points = [[0, -85], [0, 85], [590, 85], [590, 565], [1325, 565], [1325, 85], [1835, 85], [1835, 485], [2215, 485], [2215, 85], [2760, 85], [2760, -85]]);
					}
				}
			}
			color(c = [0.9000000000, 0.6000000000, 0.6000000000]) {
				translate(v = [0, 0, 2176.1000000000]) {
					linear_extrude(height = 100.0000000000) {
						polygon(paths = [[0, 1, 2, 3]], points = [[90, 1075], [90, 1325], [425, 1325], [425, 1075]]);
					}
				}
			}
			color(c = [0.9000000000, 0.6000000000, 0.6000000000]) {
				translate(v = [0, 0, 2176.1000000000]) {
					linear_extrude(height = 100.0000000000) {
						polygon(paths = [[0, 1, 2, 3, 4, 5, 6, 7, 8, 9, 10, 11]], points = [[110, 265], [110, 905], [595, 905], [595, 1885], [765, 1885], [765, 1325], [1335, 1325], [1335, 995], [845, 995], [845, 735], [420, 735], [420, 265]]);
					}
				}
			}
			color(c = [0.9000000000, 0.6000000000, 0.6000000000]) {
				translate(v = [0, 0, 2176.1000000000]) {
					linear_extrude(height = 100.0000000000) {
						polygon(paths = [[0, 1, 2, 3, 4, 5, 6, 7, 8, 9, 10, 11, 12, 13, 14, 15]], points = [[1495, 305], [1495, 825], [2065, 825], [2065, 1495], [990, 1495], [990, 1915], [1410, 1915], [1410, 1665], [2235, 1665], [2235, 1325], [2295, 1325], [2295, 995], [2235, 995], [2235, 655], [1665, 655], [1665, 305]]);
					}
				}
			}
			color(c = [0.9000000000, 0.6000000000, 0.6000000000]) {
				translate(v = [0, 0, 2176.1000000000]) {
					linear_extrude(height = 100.0000000000) {
						polygon(paths = [[0, 1, 2, 3]], points = [[540, 2085], [540, 2415], [1735, 2415], [1735, 2085]]);
					}
				}
			}
			color(c = [0.9000000000, 0.6000000000, 0.6000000000]) {
				translate(v = [0, 0, 2176.1000000000]) {
					linear_extrude(height = 100.0000000000) {
						polygon(paths = [[0, 1, 2, 3, 4, 5, 6, 7]], points = [[2405, 415], [2405, 760], [2505, 760], [2505, 1495], [2405, 1495], [2405, 2465], [2675, 2465], [2675, 415]]);
					}
				}
			}
			color(c = [0.9000000000, 0.6000000000, 0.6000000000]) {
				translate(v = [0, 0, 2176.1000000000]) {
					linear_extrude(height = 100.0000000000) {
						polygon(paths = [[0, 1, 2, 3, 4, 5, 6, 7, 8, 9, 10, 11]], points = [[90, 1495], [90, 2635], [0, 2635], [0, 2805], [2760, 2805], [2760, 2635], [2195, 2635], [2195, 1835], [1915, 1835], [1915, 2635], [345, 2635], [345, 1495]]);
					}
				}
			}
			color(c = [0.5000000000, 0.5000000000, 0.5000000000]) {
				translate(v = [0, 0, 2276.1000000000]) {
					linear_extrude(height = 340.0000000000) {
						polygon(paths = [[0, 1, 2, 3]], points = [[145, -85], [145, 85], [315, 85], [315, -85]]);
					}
				}
			}
			color(c = [0.5000000000, 0.5000000000, 0.5000000000]) {
				translate(v = [0, 0, 2276.1000000000]) {
					linear_extrude(height = 340.0000000000) {
						polygon(paths = [[0, 1, 2, 3]], points = [[605, -85], [605, 85], [775, 85], [775, -85]]);
					}
				}
			}
			color(c = [0.5000000000, 0.5000000000, 0.5000000000]) {
				translate(v = [0, 0, 2276.1000000000]) {
					linear_extrude(height = 340.0000000000) {
						polygon(paths = [[0, 1, 2, 3]], points = [[1065, -85], [1065, 85], [1235, 85], [1235, -85]]);
					}
				}
			}
			color(c = [0.5000000000, 0.5000000000, 0.5000000000]) {
				translate(v = [0, 0, 2276.1000000000]) {
					linear_extrude(height = 340.0000000000) {
						polygon(paths = [[0, 1, 2, 3]], points = [[1525, -85], [1525, 85], [1695, 85], [1695, -85]]);
					}
				}
			}
			color(c = [0.5000000000, 0.5000000000, 0.5000000000]) {
				translate(v = [0, 0, 2276.1000000000]) {
					linear_extrude(height = 340.0000000000) {
						polygon(paths = [[0, 1, 2, 3]], points = [[1985, -85], [1985, 85], [2155, 85], [2155, -85]]);
					}
				}
			}
			color(c = [0.5000000000, 0.5000000000, 0.5000000000]) {
				translate(v = [0, 0, 2276.1000000000]) {
					linear_extrude(height = 340.0000000000) {
						polygon(paths = [[0, 1, 2, 3]], points = [[2445, -85], [2445, 85], [2615, 85], [2615, -85]]);
					}
				}
			}
			color(c = [0.5000000000, 0.5000000000, 0.5000000000]) {
				translate(v = [0, 0, 2276.1000000000]) {
					linear_extrude(height = 340.0000000000) {
						polygon(paths = [[0, 1, 2, 3]], points = [[145, 2635], [145, 2805], [315, 2805], [315, 2635]]);
					}
				}
			}
			color(c = [0.5000000000, 0.5000000000, 0.5000000000]) {
				translate(v = [0, 0, 2276.1000000000]) {
					linear_extrude(height = 340.0000000000) {
						polygon(paths = [[0, 1, 2, 3]], points = [[605, 2635], [605, 2805], [775, 2805], [775, 2635]]);
					}
				}
			}
			color(c = [0.5000000000, 0.5000000000, 0.5000000000]) {
				translate(v = [0, 0, 2276.1000000000]) {
					linear_extrude(height = 340.0000000000) {
						polygon(paths = [[0, 1, 2, 3]], points = [[1065, 2635], [1065, 2805], [1235, 2805], [1235, 2635]]);
					}
				}
			}
			color(c = [0.5000000000, 0.5000000000, 0.5000000000]) {
				translate(v = [0, 0, 2276.1000000000]) {
					linear_extrude(height = 340.0000000000) {
						polygon(paths = [[0, 1, 2, 3]], points = [[1525, 2635], [1525, 2805], [1695, 2805], [1695, 2635]]);
					}
				}
			}
			color(c = [0.5000000000, 0.5000000000, 0.5000000000]) {
				translate(v = [0, 0, 2276.1000000000]) {
					linear_extrude(height = 340.0000000000) {
						polygon(paths = [[0, 1, 2, 3]], points = [[1985, 2635], [1985, 2805], [2155, 2805], [2155, 2635]]);
					}
				}
			}
			color(c = [0.5000000000, 0.5000000000, 0.5000000000]) {
				translate(v = [0, 0, 2276.1000000000]) {
					linear_extrude(height = 340.0000000000) {
						polygon(paths = [[0, 1, 2, 3]], points = [[2445, 2635], [2445, 2805], [2615, 2805], [2615, 2635]]);
					}
				}
			}
			color(c = [0.3000000000, 0.3000000000, 1]) {
				translate(v = [0, 0, 2616.1000000000]) {
					linear_extrude(height = 360.0000000000) {
						polygon(paths = [[0, 1, 2, 3]], points = [[0, -240], [0, 240], [2760, 240], [2760, -240]]);
					}
				}
			}
			color(c = [0.3000000000, 0.3000000000, 1]) {
				translate(v = [0, 0, 2616.1000000000]) {
					linear_extrude(height = 360.0000000000) {
						polygon(paths = [[0, 1, 2, 3]], points = [[0, 2480], [0, 2960], [2760, 2960], [2760, 2480]]);
					}
				}
			}
		}
	}
}
